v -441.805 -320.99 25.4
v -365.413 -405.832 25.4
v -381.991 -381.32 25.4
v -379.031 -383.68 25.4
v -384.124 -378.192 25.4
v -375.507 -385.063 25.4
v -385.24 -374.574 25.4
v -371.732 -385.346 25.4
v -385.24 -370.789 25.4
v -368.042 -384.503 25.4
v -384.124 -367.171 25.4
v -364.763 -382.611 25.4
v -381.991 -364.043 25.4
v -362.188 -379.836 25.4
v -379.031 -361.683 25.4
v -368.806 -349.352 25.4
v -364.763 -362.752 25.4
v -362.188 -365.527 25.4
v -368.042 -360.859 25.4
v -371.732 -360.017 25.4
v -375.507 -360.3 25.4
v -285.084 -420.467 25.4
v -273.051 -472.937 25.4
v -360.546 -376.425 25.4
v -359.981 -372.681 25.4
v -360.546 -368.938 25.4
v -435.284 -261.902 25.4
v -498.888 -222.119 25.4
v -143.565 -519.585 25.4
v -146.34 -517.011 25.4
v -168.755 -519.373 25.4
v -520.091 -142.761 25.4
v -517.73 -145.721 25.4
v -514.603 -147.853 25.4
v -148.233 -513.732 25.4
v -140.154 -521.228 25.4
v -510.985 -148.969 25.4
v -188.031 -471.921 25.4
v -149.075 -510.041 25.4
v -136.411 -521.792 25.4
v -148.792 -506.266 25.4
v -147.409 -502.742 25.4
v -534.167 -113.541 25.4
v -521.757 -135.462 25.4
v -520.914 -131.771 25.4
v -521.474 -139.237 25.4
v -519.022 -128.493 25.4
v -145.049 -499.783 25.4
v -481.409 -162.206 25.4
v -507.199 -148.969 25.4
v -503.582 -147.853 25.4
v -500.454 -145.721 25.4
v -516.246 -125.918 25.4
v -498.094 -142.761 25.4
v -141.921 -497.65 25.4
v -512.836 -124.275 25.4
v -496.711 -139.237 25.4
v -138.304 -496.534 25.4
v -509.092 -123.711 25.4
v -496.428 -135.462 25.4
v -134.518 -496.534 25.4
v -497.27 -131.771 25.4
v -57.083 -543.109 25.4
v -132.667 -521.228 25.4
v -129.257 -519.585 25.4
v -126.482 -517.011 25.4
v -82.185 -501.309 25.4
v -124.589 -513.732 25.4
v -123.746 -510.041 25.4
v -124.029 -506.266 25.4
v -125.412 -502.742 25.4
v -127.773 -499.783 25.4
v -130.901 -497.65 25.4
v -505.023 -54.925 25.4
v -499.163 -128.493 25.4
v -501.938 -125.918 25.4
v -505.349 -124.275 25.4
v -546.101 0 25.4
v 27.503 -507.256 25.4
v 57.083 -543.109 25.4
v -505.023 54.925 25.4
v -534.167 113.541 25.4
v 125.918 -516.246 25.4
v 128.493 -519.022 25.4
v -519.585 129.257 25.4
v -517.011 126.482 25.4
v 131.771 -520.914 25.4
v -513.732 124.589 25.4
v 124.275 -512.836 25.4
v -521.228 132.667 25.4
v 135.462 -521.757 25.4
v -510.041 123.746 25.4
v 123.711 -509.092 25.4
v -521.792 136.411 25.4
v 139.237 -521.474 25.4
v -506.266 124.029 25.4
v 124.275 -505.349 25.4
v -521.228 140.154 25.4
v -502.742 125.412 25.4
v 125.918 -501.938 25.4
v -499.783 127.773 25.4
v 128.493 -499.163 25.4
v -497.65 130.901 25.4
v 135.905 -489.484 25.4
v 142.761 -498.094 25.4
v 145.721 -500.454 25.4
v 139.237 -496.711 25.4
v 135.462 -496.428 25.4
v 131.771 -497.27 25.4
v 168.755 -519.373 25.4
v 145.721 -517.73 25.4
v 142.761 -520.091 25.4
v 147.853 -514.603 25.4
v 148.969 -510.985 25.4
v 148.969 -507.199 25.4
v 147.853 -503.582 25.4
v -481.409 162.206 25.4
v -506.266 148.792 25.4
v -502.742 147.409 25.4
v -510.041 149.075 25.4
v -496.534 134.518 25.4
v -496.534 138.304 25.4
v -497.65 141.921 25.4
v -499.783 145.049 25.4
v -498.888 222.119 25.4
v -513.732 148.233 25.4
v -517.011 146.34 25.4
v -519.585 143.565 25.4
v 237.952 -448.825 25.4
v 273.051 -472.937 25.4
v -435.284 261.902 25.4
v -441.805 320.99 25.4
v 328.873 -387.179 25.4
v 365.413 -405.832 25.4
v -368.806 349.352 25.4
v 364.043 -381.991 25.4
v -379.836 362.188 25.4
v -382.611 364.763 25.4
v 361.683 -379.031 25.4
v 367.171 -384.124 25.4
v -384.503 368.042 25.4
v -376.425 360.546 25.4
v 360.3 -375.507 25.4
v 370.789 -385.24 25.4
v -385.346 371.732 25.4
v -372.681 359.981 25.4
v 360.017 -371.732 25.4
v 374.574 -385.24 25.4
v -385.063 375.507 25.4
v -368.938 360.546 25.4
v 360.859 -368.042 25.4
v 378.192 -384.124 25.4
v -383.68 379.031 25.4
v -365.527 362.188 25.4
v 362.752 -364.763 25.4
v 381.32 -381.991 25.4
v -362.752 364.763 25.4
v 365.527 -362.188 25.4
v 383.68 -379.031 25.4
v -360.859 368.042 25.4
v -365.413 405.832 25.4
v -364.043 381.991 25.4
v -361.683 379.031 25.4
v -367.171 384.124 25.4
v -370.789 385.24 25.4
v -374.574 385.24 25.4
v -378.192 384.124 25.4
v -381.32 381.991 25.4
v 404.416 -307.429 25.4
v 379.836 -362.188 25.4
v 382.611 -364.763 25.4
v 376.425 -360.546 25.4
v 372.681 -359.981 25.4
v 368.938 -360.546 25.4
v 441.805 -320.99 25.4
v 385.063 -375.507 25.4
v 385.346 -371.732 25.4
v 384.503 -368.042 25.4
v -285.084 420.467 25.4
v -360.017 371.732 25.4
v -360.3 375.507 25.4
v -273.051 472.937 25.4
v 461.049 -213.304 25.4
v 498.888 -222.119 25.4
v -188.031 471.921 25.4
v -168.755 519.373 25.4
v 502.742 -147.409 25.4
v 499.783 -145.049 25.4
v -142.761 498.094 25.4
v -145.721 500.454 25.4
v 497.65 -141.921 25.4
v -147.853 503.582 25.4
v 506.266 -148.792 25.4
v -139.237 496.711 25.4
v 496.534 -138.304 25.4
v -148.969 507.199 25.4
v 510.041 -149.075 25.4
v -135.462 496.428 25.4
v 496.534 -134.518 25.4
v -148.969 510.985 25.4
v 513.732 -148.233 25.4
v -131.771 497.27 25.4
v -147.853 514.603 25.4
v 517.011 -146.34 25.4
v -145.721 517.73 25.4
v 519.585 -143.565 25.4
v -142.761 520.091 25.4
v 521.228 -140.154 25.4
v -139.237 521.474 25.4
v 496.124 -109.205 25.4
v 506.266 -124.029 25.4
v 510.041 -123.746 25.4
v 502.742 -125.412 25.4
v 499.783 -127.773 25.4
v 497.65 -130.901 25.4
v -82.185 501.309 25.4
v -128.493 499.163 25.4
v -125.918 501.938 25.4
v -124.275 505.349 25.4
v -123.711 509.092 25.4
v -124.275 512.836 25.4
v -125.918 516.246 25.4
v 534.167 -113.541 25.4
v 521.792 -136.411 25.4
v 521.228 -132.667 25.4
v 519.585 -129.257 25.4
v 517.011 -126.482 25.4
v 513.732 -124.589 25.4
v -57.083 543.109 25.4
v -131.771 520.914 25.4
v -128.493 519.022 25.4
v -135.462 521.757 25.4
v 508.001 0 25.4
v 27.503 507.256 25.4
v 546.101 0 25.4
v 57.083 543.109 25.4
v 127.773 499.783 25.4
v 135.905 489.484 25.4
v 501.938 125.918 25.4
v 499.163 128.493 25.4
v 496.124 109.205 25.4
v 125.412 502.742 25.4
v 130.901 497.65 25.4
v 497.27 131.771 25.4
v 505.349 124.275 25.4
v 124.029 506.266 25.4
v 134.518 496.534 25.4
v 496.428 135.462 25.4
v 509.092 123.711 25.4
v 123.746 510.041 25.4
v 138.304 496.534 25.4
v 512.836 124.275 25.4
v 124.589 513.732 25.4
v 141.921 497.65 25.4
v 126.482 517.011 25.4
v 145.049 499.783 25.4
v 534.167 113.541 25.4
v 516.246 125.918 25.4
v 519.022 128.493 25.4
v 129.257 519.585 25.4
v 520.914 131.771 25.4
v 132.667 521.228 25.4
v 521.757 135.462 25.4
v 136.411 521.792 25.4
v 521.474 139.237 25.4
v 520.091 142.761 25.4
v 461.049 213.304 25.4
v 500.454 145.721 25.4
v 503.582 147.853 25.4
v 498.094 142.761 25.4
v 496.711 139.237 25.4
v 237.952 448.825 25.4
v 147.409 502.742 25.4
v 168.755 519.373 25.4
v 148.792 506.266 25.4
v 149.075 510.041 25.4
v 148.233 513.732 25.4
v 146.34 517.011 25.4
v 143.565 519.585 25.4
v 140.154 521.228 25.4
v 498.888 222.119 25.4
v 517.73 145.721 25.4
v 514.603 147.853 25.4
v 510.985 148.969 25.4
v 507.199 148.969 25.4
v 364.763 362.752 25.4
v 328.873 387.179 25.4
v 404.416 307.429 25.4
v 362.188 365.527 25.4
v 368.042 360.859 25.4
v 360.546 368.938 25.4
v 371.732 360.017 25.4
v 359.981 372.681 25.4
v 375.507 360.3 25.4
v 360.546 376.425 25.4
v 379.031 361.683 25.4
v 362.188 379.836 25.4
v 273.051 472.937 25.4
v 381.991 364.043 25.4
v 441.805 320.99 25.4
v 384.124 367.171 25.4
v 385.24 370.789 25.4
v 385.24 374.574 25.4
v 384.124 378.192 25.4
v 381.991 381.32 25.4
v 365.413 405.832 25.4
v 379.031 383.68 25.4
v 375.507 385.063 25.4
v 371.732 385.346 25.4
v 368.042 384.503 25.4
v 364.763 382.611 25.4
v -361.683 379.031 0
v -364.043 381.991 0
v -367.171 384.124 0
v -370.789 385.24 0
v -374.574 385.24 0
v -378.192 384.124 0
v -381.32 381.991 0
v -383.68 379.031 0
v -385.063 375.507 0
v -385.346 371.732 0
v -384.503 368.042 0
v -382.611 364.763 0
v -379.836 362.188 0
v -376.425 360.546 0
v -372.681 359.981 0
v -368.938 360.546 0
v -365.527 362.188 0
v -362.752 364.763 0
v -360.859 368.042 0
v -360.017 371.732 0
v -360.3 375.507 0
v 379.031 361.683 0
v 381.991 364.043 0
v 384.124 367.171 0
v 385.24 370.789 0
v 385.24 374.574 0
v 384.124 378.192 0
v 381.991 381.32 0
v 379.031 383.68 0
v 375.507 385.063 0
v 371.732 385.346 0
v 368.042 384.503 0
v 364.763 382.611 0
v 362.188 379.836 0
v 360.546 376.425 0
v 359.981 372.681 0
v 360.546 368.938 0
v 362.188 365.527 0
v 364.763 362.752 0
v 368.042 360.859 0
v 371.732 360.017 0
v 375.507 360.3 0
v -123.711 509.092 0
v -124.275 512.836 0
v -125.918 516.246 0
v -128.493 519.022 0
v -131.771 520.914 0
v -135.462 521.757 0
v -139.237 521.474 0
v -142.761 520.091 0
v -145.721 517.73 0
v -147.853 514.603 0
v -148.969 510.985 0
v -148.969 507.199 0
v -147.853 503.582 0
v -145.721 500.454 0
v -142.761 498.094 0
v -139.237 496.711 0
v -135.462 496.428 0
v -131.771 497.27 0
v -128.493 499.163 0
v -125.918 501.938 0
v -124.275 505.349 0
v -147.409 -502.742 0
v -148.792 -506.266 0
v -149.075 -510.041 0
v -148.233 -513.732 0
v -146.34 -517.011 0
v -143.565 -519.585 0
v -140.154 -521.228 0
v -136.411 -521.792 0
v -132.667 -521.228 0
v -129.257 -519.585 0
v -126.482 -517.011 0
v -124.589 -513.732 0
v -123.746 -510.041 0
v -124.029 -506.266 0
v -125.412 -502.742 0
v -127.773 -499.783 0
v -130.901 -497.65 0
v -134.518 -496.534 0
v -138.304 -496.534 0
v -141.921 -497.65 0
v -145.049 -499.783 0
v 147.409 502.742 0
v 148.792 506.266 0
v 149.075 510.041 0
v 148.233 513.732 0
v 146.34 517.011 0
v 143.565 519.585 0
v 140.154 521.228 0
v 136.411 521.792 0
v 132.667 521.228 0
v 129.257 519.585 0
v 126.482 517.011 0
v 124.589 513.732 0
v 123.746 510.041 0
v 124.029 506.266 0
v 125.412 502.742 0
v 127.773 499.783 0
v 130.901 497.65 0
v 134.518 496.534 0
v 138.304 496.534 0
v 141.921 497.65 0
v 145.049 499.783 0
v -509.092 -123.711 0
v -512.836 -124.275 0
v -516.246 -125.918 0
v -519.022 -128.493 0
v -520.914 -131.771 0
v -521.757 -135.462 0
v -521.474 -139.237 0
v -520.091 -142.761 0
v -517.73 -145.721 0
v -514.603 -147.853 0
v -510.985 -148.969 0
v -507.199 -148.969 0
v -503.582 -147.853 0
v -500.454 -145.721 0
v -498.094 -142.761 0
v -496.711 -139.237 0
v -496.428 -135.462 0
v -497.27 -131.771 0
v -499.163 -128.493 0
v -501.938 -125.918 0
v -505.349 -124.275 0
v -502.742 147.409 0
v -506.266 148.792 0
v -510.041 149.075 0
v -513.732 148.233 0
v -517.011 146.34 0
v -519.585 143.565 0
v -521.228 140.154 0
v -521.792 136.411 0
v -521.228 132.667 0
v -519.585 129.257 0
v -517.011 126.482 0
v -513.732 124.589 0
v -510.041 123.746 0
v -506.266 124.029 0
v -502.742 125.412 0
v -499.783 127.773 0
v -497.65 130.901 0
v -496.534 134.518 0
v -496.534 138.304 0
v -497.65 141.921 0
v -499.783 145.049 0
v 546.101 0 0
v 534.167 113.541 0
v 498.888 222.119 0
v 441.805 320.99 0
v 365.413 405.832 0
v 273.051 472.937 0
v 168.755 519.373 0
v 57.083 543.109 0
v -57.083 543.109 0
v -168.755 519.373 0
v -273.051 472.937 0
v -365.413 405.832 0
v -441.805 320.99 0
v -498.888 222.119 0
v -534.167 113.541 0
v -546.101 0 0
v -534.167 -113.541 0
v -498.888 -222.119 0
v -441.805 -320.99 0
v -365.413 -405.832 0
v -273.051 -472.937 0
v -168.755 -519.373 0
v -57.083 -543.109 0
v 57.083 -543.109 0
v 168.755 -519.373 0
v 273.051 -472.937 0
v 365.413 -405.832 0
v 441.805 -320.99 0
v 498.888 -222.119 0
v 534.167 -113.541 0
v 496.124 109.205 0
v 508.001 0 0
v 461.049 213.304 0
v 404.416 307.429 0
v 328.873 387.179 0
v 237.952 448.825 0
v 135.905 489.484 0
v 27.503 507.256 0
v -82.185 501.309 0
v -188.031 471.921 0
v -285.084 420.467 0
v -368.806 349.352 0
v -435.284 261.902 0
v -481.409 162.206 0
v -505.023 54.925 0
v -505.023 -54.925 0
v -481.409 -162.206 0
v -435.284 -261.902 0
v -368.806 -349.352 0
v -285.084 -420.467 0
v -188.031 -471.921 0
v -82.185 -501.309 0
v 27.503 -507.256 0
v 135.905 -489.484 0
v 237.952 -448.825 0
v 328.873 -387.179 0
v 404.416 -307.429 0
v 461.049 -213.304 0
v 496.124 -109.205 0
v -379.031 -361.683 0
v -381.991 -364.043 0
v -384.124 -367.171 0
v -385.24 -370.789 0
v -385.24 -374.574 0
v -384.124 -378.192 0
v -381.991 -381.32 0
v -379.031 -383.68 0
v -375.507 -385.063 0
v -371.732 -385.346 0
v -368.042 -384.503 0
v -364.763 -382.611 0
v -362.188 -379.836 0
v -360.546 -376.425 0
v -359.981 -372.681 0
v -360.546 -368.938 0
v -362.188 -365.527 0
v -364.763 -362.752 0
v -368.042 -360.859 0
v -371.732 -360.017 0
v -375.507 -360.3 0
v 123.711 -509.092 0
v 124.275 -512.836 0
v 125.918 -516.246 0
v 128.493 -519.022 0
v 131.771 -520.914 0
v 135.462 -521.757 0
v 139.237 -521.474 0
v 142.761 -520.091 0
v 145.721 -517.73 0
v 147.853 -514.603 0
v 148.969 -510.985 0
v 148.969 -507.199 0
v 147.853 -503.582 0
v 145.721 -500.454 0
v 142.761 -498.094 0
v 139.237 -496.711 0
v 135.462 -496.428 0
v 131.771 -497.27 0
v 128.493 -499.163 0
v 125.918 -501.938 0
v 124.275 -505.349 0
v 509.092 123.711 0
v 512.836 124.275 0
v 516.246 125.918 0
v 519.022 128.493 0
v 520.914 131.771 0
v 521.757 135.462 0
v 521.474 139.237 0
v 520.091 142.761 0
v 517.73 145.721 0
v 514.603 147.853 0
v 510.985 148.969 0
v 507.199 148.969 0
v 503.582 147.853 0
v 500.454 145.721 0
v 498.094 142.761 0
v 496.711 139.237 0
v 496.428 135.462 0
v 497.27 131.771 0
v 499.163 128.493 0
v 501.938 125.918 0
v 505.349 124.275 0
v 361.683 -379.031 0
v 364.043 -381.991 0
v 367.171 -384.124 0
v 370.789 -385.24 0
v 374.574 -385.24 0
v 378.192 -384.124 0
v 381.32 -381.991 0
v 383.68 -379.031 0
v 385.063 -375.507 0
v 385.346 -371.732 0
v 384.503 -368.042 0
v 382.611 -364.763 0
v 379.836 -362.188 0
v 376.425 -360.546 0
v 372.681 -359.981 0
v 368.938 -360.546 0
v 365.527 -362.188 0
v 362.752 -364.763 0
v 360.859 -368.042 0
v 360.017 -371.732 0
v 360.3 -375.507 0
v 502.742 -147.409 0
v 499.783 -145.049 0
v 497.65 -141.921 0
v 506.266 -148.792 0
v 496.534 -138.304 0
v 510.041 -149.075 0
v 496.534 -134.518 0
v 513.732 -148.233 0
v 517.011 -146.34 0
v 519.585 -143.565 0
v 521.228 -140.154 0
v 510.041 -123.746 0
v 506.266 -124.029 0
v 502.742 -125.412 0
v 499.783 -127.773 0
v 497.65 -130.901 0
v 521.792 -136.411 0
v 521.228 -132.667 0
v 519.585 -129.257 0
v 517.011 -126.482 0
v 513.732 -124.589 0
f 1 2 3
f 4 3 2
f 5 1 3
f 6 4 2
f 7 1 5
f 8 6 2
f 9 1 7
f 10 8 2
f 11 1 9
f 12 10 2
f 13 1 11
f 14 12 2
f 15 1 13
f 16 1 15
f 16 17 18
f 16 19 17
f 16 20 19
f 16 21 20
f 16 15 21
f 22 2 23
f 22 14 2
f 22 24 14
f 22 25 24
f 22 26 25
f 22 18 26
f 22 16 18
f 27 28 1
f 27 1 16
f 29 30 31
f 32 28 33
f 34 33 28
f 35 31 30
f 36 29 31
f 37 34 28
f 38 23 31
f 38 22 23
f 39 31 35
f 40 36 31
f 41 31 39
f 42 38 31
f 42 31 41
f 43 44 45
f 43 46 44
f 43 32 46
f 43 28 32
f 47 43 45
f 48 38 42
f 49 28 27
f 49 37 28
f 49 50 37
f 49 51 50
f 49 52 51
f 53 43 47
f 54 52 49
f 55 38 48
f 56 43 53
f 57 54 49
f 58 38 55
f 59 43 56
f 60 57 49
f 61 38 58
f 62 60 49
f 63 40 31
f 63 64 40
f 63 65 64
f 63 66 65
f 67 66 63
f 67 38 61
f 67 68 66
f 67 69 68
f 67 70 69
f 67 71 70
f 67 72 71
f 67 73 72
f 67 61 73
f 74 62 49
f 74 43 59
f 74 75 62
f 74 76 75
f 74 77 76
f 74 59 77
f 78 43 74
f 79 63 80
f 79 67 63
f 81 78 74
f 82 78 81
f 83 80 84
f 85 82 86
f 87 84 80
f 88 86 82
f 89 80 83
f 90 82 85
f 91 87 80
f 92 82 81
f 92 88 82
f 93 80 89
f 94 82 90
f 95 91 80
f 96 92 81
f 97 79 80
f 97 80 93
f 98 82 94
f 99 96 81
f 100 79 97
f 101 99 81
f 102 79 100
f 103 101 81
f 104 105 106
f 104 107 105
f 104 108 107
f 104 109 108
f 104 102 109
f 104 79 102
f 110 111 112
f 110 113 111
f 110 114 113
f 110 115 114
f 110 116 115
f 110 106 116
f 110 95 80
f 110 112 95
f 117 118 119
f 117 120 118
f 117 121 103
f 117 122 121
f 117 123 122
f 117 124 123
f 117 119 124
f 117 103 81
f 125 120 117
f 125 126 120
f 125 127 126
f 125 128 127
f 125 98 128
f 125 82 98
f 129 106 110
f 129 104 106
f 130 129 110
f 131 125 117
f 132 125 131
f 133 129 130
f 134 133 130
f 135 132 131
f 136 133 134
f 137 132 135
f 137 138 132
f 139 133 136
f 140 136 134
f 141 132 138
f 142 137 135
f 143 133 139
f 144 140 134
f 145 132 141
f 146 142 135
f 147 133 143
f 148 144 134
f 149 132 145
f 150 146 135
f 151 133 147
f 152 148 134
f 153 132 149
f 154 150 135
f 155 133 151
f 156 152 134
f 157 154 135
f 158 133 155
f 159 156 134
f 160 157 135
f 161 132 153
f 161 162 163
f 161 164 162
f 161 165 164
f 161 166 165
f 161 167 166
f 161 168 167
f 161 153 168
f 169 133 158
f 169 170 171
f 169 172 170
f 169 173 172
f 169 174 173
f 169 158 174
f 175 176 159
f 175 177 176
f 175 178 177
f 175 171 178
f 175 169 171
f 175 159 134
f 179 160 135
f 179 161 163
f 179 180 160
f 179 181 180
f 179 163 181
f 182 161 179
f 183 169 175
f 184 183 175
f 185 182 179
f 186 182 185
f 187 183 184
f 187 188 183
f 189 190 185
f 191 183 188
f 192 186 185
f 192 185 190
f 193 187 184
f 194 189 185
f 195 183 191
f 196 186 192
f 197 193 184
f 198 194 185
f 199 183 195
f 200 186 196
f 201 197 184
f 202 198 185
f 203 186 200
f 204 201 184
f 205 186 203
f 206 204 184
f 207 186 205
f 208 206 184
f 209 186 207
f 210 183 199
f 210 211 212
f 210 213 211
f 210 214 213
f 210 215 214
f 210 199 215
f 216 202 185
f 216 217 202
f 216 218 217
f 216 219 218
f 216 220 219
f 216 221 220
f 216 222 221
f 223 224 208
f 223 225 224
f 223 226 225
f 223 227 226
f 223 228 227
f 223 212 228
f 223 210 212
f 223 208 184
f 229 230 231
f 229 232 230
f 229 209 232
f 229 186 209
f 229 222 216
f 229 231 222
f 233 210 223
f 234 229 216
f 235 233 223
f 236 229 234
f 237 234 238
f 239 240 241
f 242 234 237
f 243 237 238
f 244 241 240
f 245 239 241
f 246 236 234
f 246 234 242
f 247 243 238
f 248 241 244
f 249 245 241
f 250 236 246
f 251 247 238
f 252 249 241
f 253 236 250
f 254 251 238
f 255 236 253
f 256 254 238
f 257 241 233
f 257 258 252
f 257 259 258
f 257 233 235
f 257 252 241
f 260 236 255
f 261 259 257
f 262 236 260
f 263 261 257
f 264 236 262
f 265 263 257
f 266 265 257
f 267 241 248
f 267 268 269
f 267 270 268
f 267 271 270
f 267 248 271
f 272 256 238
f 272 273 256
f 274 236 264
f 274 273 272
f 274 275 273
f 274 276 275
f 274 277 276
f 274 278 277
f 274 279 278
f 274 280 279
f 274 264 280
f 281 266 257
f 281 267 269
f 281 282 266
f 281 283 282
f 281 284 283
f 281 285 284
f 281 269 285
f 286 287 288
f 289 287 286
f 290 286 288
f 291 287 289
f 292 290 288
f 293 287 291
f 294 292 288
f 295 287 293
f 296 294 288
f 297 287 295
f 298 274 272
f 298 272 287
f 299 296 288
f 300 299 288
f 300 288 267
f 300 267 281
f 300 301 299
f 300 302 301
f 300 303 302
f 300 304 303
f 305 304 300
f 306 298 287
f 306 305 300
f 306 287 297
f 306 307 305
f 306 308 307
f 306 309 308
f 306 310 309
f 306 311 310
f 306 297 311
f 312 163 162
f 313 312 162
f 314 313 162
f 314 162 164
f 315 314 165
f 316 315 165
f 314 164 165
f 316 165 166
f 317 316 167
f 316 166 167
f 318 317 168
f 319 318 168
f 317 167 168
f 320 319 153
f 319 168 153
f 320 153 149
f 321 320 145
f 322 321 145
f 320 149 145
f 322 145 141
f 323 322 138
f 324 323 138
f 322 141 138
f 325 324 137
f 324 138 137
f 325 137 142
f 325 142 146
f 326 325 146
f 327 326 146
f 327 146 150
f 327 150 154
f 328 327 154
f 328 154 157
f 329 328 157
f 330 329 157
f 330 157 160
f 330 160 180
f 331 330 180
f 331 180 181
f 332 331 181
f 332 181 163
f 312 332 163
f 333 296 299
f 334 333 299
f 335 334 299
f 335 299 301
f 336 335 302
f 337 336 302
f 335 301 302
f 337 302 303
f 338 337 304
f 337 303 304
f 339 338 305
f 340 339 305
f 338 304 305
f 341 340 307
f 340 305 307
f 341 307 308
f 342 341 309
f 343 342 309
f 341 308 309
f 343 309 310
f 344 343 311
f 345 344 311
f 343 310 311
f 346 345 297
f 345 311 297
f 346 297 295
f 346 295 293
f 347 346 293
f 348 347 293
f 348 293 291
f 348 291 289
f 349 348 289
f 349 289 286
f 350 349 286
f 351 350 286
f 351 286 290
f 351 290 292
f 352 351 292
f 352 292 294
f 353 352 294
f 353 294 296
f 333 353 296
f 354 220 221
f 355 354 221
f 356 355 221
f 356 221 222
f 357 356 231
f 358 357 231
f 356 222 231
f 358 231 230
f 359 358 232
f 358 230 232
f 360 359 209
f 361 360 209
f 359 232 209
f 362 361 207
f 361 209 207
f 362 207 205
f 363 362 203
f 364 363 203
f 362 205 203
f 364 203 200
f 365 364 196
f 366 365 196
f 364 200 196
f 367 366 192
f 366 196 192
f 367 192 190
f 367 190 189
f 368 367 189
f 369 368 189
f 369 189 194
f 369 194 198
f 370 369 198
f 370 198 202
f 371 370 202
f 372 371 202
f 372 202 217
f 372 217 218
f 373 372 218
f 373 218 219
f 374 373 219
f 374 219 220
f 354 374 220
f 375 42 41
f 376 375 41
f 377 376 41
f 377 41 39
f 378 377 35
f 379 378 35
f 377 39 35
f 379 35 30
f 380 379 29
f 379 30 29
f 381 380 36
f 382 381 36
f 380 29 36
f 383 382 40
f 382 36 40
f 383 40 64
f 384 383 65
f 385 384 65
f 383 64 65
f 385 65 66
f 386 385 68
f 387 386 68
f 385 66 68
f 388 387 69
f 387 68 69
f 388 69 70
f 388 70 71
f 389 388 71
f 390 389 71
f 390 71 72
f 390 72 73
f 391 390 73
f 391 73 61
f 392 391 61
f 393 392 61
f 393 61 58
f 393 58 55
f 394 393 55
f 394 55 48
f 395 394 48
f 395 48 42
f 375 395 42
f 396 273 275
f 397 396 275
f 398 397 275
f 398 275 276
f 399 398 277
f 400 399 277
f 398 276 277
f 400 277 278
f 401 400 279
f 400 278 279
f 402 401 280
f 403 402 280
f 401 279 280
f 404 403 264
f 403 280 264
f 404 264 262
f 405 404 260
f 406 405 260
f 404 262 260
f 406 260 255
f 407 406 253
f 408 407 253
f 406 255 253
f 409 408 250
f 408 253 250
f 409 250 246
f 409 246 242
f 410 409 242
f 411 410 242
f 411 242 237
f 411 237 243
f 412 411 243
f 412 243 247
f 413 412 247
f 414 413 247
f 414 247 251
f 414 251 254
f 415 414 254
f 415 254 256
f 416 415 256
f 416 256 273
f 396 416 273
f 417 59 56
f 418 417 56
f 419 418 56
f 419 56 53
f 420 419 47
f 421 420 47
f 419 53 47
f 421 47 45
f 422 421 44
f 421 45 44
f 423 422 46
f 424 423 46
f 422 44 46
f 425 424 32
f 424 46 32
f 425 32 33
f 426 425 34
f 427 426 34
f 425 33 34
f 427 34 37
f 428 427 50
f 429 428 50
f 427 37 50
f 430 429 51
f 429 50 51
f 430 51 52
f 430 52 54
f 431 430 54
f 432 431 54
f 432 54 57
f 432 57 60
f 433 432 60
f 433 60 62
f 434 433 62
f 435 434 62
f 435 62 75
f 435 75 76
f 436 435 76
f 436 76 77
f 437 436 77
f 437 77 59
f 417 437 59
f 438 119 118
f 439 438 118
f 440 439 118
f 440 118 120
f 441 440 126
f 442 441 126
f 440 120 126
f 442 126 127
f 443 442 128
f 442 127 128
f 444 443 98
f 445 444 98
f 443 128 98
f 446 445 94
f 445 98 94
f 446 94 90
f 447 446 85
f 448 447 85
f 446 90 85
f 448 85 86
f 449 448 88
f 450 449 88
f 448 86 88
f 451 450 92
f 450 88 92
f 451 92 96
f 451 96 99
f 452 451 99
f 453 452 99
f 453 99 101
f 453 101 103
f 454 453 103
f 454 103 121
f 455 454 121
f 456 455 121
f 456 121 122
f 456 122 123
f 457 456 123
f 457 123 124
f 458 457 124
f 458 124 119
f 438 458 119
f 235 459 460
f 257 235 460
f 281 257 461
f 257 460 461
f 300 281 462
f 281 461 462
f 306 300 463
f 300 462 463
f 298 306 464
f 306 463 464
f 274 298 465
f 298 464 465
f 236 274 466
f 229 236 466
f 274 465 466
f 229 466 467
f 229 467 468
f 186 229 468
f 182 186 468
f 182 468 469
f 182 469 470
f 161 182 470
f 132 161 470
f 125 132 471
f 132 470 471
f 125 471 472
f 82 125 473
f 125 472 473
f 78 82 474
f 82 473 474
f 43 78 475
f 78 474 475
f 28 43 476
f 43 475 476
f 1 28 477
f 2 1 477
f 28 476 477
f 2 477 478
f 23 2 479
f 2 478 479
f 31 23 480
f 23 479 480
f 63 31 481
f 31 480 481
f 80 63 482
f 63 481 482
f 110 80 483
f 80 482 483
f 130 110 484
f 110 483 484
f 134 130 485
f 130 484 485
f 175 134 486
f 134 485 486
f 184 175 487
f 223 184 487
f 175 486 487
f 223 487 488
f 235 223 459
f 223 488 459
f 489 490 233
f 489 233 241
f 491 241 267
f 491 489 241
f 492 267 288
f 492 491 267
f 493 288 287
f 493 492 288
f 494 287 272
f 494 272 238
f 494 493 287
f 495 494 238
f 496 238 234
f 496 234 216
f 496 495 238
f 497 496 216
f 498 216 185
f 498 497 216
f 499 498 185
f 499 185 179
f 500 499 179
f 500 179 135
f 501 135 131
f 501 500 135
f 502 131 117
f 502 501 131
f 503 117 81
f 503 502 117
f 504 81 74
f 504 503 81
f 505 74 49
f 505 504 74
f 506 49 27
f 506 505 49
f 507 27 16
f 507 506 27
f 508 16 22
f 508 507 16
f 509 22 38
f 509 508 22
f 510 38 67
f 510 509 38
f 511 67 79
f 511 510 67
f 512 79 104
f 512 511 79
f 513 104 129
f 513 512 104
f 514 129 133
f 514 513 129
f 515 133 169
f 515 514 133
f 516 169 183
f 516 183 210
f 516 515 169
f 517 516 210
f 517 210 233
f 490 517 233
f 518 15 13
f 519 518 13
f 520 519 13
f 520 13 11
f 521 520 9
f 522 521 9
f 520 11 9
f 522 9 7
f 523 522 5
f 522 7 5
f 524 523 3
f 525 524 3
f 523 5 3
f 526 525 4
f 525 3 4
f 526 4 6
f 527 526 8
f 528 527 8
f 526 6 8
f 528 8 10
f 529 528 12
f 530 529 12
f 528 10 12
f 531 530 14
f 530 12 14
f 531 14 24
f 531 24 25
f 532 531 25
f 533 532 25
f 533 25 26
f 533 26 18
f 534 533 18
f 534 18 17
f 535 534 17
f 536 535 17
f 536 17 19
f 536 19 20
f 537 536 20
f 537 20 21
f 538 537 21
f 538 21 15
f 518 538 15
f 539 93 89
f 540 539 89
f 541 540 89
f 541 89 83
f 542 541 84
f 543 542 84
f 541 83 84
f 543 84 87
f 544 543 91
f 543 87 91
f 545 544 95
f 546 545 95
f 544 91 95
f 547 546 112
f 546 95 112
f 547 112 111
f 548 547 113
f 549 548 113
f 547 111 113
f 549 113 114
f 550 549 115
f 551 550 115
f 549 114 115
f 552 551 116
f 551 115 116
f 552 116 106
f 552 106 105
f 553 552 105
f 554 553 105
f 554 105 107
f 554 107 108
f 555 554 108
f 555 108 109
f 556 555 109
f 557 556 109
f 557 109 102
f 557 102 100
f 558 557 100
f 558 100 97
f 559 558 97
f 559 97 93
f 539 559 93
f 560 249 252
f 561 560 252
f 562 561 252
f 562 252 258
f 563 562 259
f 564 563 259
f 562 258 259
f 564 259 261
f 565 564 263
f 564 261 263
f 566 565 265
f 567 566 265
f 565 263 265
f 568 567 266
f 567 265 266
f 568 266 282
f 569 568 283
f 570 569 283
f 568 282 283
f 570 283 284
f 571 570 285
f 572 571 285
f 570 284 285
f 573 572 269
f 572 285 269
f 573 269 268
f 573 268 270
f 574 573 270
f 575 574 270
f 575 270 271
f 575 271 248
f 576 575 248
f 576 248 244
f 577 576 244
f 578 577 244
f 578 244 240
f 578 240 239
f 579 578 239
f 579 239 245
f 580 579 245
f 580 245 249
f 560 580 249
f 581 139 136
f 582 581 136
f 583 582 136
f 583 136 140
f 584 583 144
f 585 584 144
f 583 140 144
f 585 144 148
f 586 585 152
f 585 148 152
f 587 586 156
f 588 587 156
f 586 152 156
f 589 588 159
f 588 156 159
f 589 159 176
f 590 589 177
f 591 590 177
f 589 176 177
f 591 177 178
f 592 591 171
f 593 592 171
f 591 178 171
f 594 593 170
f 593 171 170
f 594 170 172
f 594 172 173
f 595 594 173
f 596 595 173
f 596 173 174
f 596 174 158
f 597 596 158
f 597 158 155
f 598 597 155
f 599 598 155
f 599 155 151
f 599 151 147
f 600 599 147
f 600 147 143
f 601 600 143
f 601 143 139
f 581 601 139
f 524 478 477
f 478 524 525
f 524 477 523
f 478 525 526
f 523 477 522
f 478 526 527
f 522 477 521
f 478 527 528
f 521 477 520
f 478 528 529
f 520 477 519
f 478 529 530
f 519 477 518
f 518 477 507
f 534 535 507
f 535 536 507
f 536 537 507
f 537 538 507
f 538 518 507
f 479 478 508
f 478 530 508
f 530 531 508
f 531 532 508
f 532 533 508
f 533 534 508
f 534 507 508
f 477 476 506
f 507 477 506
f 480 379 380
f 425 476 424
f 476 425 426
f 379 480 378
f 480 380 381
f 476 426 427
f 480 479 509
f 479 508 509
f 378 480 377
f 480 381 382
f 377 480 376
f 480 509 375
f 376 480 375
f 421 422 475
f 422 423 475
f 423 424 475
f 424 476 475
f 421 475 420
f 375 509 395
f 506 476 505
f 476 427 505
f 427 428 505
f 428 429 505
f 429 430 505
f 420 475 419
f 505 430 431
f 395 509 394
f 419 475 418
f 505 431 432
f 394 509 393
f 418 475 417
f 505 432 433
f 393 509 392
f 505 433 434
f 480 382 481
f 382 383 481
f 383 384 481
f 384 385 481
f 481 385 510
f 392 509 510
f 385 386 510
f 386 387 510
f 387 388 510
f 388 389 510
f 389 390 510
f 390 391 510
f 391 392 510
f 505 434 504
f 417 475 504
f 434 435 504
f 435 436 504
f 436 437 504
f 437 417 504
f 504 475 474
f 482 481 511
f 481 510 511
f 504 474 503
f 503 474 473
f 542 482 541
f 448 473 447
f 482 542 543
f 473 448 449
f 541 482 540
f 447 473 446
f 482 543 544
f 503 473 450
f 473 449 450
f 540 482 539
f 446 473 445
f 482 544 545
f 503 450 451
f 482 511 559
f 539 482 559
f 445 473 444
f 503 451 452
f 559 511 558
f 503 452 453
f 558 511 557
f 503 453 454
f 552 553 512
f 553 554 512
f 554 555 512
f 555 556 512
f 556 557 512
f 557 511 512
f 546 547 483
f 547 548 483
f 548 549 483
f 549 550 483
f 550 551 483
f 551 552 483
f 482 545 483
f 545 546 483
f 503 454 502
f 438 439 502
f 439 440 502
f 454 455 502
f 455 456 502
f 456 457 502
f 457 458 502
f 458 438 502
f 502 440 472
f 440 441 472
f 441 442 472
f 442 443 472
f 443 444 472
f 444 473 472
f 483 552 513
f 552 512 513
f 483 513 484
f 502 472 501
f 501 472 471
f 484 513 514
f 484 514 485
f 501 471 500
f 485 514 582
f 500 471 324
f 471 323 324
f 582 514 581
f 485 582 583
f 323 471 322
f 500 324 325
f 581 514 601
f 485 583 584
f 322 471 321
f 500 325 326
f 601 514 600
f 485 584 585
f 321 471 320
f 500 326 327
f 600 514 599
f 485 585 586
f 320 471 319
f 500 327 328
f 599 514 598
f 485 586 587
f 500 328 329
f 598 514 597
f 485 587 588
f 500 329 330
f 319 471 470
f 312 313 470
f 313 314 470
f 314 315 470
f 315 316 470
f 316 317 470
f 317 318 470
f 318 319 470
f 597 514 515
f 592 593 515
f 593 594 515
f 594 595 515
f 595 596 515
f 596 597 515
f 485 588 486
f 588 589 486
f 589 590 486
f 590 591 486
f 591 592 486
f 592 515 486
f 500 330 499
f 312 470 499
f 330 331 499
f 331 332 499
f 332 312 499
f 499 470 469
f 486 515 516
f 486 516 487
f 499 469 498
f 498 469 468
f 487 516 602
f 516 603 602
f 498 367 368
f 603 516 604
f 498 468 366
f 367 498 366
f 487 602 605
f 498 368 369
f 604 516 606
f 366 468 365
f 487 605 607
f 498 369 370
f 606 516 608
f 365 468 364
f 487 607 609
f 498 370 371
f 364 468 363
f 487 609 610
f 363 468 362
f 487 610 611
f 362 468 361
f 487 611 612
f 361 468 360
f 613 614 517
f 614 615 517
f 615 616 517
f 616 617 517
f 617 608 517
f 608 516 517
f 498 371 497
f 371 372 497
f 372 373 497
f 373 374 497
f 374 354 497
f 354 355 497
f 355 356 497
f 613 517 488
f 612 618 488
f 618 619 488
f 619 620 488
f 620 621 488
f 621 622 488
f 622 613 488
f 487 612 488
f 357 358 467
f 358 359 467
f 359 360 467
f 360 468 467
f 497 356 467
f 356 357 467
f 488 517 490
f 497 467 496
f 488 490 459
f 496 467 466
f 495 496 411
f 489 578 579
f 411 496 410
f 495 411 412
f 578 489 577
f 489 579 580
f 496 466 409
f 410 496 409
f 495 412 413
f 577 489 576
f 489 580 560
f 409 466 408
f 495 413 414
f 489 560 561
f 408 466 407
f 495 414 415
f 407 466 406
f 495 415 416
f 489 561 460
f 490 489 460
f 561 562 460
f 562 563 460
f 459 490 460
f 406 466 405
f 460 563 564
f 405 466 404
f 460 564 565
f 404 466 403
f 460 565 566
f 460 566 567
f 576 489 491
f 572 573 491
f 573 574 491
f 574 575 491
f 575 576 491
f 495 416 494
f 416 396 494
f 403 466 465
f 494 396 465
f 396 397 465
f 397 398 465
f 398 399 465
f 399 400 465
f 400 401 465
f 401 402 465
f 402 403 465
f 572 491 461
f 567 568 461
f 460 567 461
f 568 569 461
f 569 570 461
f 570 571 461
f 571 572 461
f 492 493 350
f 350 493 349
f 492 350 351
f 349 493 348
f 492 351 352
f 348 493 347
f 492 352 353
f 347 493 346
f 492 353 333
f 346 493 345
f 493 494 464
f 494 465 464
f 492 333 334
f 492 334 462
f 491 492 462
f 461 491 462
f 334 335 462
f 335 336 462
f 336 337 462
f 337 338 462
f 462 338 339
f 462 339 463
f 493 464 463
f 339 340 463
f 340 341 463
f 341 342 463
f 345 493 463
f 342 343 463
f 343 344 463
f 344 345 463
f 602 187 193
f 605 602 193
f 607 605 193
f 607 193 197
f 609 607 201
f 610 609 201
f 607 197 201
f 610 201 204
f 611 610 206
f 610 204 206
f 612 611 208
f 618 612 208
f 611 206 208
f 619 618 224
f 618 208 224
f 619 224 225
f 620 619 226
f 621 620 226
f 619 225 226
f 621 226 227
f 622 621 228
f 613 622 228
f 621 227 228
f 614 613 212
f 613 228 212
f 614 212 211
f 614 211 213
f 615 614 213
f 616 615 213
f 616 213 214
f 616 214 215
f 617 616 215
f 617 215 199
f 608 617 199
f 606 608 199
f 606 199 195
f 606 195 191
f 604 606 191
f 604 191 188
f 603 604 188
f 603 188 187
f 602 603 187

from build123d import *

# Parameters (mm, degrees)
FLANGESKETCH_R      = 546.101092202
FLANGESKETCH_R_2    = 508.001016002
FLANGEFEATURE_DEPTH = 25.4000508
SKETCH2_R           = 12.7
BOLT_HOLE_DEPTH     = 26.4000508
BOLTPATTERN_COUNT   = 12


with BuildPart() as part:
    # FlangeSketch → FlangeFeature (new body)
    with BuildSketch(Plane.XY):
        Circle(FLANGESKETCH_R)
        Circle(FLANGESKETCH_R_2, mode=Mode.SUBTRACT)
    extrude(amount=FLANGEFEATURE_DEPTH)

    # Sketch2 → Bolt Hole (cut, through all)
    with BuildSketch(Plane.XY.offset(25.4000508)):
        with Locations((-136.410860404, 509.092261732)):
            Circle(SKETCH2_R)
    bolt_hole = extrude(amount=-BOLT_HOLE_DEPTH, mode=Mode.SUBTRACT)

    # BoltPattern: Bolt Hole ×12 about axis
    boltpattern_axis = Axis((0, 0, 0), (0, 0, 1))
    for i in range(1, BOLTPATTERN_COUNT):
        add(bolt_hole.rotate(boltpattern_axis, i * 360 / BOLTPATTERN_COUNT), mode=Mode.SUBTRACT)


solid = part.part
